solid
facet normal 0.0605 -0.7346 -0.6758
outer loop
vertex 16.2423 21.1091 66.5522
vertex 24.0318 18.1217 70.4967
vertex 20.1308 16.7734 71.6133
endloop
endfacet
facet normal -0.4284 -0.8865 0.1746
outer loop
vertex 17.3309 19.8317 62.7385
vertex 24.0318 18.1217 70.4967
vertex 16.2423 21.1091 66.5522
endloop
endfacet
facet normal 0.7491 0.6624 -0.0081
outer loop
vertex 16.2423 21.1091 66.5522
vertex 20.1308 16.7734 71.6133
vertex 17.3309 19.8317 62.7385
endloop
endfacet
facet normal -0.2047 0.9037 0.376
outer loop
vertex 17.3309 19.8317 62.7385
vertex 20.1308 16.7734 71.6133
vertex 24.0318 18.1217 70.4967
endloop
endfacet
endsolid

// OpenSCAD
// Auto-generated auxetic polyhedron
points = [
    [20.130822, 16.773409, 71.613288],
    [24.031832, 18.121695, 70.496698],
    [16.242278, 21.109075, 66.552211],
    [17.330870, 19.831671, 62.738529],
];

faces = [
    [0, 1, 2],
    [2, 1, 3],
    [3, 0, 2],
    [1, 0, 3],
];

polyhedron(points = points, faces = faces);
